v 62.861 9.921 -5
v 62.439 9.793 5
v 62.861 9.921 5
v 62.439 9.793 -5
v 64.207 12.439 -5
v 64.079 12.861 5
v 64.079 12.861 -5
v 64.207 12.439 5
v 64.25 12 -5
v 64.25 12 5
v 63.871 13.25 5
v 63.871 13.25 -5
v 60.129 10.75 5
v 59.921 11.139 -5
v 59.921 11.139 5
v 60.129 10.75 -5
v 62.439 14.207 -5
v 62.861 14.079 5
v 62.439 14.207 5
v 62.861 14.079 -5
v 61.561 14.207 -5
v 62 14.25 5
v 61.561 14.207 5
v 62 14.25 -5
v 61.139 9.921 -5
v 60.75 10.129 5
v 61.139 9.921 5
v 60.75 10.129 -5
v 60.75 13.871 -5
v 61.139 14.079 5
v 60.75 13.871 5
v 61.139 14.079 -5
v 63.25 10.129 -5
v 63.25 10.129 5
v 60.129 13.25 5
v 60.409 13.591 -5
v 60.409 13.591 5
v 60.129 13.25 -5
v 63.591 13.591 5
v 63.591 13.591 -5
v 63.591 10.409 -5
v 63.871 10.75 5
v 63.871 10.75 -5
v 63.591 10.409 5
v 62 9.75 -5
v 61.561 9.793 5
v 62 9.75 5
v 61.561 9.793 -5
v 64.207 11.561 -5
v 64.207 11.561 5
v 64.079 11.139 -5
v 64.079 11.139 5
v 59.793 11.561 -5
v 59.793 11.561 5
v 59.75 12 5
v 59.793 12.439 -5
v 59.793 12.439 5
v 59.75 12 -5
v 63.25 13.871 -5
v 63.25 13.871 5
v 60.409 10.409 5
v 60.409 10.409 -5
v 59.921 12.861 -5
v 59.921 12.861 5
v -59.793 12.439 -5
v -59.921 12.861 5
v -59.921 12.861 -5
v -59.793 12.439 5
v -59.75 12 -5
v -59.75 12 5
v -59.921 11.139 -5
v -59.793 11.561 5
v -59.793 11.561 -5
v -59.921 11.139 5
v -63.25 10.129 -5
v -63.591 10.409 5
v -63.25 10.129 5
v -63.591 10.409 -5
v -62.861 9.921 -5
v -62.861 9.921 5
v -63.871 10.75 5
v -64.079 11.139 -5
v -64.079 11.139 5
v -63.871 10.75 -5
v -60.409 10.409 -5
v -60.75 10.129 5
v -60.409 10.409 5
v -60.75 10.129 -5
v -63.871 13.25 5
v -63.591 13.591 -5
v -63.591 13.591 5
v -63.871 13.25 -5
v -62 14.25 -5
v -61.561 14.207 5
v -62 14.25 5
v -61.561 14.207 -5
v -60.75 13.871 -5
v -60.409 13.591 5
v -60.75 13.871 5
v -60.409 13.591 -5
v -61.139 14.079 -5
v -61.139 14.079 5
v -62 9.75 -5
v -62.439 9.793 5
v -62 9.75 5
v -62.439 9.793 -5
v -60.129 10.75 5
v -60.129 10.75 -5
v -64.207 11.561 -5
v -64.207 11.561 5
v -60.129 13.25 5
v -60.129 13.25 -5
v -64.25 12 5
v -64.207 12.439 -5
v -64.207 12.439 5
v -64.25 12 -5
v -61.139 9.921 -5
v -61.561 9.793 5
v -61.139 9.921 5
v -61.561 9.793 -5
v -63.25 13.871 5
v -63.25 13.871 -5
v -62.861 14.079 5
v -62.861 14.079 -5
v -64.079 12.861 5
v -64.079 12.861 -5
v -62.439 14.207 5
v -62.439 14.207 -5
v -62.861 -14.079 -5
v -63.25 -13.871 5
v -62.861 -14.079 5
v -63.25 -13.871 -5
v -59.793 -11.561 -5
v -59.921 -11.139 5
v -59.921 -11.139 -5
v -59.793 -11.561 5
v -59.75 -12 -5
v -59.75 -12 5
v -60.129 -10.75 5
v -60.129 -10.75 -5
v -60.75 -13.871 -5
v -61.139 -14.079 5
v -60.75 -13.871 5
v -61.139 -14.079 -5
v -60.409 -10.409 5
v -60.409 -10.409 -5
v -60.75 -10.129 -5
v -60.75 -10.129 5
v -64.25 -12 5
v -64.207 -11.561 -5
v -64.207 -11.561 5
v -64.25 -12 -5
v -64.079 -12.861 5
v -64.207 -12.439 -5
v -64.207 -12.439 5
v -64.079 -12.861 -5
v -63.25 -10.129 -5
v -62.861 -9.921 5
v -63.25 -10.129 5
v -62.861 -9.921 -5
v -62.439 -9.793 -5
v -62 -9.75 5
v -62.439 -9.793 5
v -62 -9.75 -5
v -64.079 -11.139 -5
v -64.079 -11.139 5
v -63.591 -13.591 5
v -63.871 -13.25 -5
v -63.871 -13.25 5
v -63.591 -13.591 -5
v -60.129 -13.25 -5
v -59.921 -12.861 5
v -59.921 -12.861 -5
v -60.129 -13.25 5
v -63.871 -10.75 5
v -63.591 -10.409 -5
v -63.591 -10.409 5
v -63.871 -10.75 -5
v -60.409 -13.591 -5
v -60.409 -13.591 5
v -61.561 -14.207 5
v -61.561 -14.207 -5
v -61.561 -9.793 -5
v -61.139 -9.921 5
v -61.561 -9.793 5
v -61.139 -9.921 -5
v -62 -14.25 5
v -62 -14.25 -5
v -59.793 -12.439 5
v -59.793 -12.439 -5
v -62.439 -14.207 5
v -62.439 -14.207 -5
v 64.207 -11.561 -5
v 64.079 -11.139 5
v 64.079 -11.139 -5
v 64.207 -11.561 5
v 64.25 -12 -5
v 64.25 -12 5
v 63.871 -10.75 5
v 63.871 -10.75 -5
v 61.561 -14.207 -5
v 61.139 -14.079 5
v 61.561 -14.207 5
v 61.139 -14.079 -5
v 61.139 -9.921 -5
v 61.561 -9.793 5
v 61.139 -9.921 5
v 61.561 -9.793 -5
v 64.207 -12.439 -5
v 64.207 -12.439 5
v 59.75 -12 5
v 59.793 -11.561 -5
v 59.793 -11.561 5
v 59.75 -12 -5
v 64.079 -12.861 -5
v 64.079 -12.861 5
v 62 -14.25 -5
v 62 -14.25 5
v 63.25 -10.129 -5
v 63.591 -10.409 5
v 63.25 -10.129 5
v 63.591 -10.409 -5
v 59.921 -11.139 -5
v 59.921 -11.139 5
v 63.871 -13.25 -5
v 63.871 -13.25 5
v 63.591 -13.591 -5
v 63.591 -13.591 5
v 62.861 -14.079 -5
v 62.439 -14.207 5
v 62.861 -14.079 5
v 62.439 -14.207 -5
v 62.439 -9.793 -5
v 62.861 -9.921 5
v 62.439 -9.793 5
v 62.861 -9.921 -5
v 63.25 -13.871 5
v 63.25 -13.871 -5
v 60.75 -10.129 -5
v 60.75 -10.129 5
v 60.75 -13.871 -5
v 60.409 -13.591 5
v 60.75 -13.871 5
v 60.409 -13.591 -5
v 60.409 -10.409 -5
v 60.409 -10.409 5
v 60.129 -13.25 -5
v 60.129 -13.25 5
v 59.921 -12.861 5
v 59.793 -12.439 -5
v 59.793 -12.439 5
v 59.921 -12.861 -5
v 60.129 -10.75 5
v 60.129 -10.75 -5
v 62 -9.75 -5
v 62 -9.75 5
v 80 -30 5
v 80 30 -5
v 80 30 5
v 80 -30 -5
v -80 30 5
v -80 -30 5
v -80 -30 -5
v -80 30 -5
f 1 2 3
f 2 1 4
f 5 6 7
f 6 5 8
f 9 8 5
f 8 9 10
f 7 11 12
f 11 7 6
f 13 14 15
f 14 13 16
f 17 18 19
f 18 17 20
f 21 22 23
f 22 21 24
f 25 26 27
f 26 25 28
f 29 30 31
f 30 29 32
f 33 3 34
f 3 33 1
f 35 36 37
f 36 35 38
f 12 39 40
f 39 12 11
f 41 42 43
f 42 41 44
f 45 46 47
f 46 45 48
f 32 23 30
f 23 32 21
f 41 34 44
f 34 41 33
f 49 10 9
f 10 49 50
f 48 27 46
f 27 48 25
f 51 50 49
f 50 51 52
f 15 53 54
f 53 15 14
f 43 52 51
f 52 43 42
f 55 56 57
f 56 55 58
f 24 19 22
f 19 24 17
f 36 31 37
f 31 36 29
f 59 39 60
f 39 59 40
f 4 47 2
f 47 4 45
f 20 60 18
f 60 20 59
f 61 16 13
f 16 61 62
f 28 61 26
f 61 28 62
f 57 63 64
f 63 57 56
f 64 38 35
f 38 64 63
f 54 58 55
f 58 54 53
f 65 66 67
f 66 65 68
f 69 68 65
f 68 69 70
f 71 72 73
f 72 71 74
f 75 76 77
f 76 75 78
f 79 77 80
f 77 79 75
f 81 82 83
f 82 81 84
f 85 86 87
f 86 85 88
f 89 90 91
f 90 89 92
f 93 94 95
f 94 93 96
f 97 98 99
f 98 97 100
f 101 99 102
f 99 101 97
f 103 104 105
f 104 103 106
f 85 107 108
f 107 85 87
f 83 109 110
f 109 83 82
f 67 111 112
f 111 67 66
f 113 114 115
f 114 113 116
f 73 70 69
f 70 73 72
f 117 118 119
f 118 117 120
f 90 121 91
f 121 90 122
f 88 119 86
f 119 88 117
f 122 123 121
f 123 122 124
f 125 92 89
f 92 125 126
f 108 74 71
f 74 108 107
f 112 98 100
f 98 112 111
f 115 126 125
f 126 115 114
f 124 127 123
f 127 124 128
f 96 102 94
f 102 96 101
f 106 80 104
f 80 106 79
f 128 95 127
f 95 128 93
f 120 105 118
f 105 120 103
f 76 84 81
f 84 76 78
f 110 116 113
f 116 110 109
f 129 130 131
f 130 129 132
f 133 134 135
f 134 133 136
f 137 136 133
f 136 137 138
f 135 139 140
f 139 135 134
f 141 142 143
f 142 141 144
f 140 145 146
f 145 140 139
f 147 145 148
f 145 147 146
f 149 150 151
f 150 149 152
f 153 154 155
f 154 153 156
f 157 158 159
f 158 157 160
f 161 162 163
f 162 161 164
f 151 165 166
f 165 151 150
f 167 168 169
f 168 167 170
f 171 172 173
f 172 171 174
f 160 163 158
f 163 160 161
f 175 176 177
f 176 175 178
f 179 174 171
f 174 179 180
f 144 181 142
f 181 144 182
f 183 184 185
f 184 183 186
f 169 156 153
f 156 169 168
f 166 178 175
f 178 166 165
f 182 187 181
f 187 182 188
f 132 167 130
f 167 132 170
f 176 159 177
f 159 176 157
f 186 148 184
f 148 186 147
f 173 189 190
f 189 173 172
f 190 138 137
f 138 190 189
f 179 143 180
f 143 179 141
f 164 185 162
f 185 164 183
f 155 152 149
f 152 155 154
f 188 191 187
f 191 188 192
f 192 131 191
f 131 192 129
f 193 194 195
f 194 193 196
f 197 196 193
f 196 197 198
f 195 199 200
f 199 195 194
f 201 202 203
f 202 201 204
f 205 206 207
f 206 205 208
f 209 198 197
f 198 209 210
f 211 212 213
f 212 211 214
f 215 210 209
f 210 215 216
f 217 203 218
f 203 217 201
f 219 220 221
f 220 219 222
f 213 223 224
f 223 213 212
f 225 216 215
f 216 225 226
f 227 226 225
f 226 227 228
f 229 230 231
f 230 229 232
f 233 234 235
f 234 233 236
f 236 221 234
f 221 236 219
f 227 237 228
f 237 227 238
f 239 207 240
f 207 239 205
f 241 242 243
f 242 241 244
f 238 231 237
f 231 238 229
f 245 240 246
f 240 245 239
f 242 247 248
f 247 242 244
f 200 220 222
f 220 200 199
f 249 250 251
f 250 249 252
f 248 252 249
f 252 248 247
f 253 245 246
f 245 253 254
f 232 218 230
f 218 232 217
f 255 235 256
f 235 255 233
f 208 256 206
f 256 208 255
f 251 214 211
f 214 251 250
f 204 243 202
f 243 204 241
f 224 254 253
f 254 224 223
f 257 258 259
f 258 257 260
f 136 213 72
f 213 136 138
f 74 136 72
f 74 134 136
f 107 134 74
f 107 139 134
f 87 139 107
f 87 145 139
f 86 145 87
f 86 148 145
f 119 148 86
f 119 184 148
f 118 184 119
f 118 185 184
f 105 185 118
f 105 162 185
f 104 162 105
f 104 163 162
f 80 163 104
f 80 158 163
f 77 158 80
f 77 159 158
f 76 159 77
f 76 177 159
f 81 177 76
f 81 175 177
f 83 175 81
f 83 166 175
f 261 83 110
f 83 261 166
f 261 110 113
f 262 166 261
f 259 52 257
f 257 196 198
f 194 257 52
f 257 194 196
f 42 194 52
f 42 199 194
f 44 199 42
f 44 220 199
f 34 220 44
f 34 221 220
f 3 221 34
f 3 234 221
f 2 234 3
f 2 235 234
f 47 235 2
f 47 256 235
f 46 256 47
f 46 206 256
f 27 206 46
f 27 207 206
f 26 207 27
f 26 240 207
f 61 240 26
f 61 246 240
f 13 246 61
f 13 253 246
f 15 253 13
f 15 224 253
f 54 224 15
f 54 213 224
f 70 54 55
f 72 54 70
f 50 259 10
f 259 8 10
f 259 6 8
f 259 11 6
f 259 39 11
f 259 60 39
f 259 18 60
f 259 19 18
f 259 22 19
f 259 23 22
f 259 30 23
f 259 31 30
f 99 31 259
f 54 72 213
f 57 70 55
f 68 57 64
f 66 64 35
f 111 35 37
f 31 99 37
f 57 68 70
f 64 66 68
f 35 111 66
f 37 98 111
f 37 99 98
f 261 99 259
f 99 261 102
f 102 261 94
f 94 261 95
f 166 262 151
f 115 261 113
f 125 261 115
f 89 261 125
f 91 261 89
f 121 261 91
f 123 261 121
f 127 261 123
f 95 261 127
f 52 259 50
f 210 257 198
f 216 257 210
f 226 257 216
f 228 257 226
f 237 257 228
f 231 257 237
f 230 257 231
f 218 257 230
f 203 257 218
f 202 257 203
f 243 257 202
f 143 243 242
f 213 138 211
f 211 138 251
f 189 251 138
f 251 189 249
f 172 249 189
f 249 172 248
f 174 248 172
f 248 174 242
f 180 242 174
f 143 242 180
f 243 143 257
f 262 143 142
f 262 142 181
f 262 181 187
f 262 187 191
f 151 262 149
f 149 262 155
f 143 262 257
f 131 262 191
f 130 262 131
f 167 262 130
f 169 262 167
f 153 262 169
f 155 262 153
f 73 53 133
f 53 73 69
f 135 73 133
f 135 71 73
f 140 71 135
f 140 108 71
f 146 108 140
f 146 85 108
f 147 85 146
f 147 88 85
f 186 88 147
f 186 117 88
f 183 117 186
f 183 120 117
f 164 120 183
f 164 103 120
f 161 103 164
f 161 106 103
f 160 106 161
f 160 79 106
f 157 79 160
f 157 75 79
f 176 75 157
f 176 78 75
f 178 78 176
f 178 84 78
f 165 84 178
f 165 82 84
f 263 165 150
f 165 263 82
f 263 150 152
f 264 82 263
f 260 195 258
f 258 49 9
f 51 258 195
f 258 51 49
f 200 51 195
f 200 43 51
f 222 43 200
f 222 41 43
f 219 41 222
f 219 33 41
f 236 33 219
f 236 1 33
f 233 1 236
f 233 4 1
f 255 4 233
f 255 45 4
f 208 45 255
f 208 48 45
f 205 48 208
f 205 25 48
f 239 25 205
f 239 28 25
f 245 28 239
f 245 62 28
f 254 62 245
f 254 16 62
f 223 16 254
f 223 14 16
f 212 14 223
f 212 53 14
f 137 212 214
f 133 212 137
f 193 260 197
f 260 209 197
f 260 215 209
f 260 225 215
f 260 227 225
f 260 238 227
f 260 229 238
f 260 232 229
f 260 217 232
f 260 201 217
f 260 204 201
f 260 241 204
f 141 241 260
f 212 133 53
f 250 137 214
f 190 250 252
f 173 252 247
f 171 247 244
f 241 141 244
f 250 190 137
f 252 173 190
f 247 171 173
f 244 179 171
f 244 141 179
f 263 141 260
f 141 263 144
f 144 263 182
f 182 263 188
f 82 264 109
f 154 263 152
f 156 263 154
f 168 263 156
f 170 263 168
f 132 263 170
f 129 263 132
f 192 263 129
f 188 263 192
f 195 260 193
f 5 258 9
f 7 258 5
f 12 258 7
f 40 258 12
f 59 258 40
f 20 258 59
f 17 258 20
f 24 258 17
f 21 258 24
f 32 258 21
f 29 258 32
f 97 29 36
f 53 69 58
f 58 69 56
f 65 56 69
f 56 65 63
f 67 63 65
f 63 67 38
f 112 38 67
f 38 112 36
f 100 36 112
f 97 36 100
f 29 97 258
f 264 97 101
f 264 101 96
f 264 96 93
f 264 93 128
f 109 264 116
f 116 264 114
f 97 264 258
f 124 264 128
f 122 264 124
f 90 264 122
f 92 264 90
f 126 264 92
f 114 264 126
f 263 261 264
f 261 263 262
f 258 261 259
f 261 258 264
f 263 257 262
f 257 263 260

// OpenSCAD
$fn = 32;

// ----------------------------------------------------------------------
// Corner plate 160 x 60 x 10
// 4 holes, centres taken from the edge offset
// ----------------------------------------------------------------------

// --- parameters (mm) ---
plate = [160, 60, 10];  // overall size (x, y, z)
holes = 4;              // number of holes the drawing asks for
hole_d = 4.5;           // hole diameter
edge = 18;              // hole centre offset from the plate edge

// --- derived feature positions (mm) ---
corner_x = plate[0] / 2 - edge;  // = 62   corner hole X
corner_y = plate[1] / 2 - edge;  // = 12   corner hole Y
feature_centers = [
  [corner_x, corner_y],
  [-corner_x, corner_y],
  [-corner_x, -corner_y],
  [corner_x, -corner_y]
];   // hole centres the loop below drills

// plate outline, every hole drilled through with the same cutters
difference() {
  cube(plate, center = true);
  for (centre = feature_centers)
    translate([centre[0], centre[1], 0])
      cylinder(d = hole_d, h = plate[2] + 2, center = true);
}
